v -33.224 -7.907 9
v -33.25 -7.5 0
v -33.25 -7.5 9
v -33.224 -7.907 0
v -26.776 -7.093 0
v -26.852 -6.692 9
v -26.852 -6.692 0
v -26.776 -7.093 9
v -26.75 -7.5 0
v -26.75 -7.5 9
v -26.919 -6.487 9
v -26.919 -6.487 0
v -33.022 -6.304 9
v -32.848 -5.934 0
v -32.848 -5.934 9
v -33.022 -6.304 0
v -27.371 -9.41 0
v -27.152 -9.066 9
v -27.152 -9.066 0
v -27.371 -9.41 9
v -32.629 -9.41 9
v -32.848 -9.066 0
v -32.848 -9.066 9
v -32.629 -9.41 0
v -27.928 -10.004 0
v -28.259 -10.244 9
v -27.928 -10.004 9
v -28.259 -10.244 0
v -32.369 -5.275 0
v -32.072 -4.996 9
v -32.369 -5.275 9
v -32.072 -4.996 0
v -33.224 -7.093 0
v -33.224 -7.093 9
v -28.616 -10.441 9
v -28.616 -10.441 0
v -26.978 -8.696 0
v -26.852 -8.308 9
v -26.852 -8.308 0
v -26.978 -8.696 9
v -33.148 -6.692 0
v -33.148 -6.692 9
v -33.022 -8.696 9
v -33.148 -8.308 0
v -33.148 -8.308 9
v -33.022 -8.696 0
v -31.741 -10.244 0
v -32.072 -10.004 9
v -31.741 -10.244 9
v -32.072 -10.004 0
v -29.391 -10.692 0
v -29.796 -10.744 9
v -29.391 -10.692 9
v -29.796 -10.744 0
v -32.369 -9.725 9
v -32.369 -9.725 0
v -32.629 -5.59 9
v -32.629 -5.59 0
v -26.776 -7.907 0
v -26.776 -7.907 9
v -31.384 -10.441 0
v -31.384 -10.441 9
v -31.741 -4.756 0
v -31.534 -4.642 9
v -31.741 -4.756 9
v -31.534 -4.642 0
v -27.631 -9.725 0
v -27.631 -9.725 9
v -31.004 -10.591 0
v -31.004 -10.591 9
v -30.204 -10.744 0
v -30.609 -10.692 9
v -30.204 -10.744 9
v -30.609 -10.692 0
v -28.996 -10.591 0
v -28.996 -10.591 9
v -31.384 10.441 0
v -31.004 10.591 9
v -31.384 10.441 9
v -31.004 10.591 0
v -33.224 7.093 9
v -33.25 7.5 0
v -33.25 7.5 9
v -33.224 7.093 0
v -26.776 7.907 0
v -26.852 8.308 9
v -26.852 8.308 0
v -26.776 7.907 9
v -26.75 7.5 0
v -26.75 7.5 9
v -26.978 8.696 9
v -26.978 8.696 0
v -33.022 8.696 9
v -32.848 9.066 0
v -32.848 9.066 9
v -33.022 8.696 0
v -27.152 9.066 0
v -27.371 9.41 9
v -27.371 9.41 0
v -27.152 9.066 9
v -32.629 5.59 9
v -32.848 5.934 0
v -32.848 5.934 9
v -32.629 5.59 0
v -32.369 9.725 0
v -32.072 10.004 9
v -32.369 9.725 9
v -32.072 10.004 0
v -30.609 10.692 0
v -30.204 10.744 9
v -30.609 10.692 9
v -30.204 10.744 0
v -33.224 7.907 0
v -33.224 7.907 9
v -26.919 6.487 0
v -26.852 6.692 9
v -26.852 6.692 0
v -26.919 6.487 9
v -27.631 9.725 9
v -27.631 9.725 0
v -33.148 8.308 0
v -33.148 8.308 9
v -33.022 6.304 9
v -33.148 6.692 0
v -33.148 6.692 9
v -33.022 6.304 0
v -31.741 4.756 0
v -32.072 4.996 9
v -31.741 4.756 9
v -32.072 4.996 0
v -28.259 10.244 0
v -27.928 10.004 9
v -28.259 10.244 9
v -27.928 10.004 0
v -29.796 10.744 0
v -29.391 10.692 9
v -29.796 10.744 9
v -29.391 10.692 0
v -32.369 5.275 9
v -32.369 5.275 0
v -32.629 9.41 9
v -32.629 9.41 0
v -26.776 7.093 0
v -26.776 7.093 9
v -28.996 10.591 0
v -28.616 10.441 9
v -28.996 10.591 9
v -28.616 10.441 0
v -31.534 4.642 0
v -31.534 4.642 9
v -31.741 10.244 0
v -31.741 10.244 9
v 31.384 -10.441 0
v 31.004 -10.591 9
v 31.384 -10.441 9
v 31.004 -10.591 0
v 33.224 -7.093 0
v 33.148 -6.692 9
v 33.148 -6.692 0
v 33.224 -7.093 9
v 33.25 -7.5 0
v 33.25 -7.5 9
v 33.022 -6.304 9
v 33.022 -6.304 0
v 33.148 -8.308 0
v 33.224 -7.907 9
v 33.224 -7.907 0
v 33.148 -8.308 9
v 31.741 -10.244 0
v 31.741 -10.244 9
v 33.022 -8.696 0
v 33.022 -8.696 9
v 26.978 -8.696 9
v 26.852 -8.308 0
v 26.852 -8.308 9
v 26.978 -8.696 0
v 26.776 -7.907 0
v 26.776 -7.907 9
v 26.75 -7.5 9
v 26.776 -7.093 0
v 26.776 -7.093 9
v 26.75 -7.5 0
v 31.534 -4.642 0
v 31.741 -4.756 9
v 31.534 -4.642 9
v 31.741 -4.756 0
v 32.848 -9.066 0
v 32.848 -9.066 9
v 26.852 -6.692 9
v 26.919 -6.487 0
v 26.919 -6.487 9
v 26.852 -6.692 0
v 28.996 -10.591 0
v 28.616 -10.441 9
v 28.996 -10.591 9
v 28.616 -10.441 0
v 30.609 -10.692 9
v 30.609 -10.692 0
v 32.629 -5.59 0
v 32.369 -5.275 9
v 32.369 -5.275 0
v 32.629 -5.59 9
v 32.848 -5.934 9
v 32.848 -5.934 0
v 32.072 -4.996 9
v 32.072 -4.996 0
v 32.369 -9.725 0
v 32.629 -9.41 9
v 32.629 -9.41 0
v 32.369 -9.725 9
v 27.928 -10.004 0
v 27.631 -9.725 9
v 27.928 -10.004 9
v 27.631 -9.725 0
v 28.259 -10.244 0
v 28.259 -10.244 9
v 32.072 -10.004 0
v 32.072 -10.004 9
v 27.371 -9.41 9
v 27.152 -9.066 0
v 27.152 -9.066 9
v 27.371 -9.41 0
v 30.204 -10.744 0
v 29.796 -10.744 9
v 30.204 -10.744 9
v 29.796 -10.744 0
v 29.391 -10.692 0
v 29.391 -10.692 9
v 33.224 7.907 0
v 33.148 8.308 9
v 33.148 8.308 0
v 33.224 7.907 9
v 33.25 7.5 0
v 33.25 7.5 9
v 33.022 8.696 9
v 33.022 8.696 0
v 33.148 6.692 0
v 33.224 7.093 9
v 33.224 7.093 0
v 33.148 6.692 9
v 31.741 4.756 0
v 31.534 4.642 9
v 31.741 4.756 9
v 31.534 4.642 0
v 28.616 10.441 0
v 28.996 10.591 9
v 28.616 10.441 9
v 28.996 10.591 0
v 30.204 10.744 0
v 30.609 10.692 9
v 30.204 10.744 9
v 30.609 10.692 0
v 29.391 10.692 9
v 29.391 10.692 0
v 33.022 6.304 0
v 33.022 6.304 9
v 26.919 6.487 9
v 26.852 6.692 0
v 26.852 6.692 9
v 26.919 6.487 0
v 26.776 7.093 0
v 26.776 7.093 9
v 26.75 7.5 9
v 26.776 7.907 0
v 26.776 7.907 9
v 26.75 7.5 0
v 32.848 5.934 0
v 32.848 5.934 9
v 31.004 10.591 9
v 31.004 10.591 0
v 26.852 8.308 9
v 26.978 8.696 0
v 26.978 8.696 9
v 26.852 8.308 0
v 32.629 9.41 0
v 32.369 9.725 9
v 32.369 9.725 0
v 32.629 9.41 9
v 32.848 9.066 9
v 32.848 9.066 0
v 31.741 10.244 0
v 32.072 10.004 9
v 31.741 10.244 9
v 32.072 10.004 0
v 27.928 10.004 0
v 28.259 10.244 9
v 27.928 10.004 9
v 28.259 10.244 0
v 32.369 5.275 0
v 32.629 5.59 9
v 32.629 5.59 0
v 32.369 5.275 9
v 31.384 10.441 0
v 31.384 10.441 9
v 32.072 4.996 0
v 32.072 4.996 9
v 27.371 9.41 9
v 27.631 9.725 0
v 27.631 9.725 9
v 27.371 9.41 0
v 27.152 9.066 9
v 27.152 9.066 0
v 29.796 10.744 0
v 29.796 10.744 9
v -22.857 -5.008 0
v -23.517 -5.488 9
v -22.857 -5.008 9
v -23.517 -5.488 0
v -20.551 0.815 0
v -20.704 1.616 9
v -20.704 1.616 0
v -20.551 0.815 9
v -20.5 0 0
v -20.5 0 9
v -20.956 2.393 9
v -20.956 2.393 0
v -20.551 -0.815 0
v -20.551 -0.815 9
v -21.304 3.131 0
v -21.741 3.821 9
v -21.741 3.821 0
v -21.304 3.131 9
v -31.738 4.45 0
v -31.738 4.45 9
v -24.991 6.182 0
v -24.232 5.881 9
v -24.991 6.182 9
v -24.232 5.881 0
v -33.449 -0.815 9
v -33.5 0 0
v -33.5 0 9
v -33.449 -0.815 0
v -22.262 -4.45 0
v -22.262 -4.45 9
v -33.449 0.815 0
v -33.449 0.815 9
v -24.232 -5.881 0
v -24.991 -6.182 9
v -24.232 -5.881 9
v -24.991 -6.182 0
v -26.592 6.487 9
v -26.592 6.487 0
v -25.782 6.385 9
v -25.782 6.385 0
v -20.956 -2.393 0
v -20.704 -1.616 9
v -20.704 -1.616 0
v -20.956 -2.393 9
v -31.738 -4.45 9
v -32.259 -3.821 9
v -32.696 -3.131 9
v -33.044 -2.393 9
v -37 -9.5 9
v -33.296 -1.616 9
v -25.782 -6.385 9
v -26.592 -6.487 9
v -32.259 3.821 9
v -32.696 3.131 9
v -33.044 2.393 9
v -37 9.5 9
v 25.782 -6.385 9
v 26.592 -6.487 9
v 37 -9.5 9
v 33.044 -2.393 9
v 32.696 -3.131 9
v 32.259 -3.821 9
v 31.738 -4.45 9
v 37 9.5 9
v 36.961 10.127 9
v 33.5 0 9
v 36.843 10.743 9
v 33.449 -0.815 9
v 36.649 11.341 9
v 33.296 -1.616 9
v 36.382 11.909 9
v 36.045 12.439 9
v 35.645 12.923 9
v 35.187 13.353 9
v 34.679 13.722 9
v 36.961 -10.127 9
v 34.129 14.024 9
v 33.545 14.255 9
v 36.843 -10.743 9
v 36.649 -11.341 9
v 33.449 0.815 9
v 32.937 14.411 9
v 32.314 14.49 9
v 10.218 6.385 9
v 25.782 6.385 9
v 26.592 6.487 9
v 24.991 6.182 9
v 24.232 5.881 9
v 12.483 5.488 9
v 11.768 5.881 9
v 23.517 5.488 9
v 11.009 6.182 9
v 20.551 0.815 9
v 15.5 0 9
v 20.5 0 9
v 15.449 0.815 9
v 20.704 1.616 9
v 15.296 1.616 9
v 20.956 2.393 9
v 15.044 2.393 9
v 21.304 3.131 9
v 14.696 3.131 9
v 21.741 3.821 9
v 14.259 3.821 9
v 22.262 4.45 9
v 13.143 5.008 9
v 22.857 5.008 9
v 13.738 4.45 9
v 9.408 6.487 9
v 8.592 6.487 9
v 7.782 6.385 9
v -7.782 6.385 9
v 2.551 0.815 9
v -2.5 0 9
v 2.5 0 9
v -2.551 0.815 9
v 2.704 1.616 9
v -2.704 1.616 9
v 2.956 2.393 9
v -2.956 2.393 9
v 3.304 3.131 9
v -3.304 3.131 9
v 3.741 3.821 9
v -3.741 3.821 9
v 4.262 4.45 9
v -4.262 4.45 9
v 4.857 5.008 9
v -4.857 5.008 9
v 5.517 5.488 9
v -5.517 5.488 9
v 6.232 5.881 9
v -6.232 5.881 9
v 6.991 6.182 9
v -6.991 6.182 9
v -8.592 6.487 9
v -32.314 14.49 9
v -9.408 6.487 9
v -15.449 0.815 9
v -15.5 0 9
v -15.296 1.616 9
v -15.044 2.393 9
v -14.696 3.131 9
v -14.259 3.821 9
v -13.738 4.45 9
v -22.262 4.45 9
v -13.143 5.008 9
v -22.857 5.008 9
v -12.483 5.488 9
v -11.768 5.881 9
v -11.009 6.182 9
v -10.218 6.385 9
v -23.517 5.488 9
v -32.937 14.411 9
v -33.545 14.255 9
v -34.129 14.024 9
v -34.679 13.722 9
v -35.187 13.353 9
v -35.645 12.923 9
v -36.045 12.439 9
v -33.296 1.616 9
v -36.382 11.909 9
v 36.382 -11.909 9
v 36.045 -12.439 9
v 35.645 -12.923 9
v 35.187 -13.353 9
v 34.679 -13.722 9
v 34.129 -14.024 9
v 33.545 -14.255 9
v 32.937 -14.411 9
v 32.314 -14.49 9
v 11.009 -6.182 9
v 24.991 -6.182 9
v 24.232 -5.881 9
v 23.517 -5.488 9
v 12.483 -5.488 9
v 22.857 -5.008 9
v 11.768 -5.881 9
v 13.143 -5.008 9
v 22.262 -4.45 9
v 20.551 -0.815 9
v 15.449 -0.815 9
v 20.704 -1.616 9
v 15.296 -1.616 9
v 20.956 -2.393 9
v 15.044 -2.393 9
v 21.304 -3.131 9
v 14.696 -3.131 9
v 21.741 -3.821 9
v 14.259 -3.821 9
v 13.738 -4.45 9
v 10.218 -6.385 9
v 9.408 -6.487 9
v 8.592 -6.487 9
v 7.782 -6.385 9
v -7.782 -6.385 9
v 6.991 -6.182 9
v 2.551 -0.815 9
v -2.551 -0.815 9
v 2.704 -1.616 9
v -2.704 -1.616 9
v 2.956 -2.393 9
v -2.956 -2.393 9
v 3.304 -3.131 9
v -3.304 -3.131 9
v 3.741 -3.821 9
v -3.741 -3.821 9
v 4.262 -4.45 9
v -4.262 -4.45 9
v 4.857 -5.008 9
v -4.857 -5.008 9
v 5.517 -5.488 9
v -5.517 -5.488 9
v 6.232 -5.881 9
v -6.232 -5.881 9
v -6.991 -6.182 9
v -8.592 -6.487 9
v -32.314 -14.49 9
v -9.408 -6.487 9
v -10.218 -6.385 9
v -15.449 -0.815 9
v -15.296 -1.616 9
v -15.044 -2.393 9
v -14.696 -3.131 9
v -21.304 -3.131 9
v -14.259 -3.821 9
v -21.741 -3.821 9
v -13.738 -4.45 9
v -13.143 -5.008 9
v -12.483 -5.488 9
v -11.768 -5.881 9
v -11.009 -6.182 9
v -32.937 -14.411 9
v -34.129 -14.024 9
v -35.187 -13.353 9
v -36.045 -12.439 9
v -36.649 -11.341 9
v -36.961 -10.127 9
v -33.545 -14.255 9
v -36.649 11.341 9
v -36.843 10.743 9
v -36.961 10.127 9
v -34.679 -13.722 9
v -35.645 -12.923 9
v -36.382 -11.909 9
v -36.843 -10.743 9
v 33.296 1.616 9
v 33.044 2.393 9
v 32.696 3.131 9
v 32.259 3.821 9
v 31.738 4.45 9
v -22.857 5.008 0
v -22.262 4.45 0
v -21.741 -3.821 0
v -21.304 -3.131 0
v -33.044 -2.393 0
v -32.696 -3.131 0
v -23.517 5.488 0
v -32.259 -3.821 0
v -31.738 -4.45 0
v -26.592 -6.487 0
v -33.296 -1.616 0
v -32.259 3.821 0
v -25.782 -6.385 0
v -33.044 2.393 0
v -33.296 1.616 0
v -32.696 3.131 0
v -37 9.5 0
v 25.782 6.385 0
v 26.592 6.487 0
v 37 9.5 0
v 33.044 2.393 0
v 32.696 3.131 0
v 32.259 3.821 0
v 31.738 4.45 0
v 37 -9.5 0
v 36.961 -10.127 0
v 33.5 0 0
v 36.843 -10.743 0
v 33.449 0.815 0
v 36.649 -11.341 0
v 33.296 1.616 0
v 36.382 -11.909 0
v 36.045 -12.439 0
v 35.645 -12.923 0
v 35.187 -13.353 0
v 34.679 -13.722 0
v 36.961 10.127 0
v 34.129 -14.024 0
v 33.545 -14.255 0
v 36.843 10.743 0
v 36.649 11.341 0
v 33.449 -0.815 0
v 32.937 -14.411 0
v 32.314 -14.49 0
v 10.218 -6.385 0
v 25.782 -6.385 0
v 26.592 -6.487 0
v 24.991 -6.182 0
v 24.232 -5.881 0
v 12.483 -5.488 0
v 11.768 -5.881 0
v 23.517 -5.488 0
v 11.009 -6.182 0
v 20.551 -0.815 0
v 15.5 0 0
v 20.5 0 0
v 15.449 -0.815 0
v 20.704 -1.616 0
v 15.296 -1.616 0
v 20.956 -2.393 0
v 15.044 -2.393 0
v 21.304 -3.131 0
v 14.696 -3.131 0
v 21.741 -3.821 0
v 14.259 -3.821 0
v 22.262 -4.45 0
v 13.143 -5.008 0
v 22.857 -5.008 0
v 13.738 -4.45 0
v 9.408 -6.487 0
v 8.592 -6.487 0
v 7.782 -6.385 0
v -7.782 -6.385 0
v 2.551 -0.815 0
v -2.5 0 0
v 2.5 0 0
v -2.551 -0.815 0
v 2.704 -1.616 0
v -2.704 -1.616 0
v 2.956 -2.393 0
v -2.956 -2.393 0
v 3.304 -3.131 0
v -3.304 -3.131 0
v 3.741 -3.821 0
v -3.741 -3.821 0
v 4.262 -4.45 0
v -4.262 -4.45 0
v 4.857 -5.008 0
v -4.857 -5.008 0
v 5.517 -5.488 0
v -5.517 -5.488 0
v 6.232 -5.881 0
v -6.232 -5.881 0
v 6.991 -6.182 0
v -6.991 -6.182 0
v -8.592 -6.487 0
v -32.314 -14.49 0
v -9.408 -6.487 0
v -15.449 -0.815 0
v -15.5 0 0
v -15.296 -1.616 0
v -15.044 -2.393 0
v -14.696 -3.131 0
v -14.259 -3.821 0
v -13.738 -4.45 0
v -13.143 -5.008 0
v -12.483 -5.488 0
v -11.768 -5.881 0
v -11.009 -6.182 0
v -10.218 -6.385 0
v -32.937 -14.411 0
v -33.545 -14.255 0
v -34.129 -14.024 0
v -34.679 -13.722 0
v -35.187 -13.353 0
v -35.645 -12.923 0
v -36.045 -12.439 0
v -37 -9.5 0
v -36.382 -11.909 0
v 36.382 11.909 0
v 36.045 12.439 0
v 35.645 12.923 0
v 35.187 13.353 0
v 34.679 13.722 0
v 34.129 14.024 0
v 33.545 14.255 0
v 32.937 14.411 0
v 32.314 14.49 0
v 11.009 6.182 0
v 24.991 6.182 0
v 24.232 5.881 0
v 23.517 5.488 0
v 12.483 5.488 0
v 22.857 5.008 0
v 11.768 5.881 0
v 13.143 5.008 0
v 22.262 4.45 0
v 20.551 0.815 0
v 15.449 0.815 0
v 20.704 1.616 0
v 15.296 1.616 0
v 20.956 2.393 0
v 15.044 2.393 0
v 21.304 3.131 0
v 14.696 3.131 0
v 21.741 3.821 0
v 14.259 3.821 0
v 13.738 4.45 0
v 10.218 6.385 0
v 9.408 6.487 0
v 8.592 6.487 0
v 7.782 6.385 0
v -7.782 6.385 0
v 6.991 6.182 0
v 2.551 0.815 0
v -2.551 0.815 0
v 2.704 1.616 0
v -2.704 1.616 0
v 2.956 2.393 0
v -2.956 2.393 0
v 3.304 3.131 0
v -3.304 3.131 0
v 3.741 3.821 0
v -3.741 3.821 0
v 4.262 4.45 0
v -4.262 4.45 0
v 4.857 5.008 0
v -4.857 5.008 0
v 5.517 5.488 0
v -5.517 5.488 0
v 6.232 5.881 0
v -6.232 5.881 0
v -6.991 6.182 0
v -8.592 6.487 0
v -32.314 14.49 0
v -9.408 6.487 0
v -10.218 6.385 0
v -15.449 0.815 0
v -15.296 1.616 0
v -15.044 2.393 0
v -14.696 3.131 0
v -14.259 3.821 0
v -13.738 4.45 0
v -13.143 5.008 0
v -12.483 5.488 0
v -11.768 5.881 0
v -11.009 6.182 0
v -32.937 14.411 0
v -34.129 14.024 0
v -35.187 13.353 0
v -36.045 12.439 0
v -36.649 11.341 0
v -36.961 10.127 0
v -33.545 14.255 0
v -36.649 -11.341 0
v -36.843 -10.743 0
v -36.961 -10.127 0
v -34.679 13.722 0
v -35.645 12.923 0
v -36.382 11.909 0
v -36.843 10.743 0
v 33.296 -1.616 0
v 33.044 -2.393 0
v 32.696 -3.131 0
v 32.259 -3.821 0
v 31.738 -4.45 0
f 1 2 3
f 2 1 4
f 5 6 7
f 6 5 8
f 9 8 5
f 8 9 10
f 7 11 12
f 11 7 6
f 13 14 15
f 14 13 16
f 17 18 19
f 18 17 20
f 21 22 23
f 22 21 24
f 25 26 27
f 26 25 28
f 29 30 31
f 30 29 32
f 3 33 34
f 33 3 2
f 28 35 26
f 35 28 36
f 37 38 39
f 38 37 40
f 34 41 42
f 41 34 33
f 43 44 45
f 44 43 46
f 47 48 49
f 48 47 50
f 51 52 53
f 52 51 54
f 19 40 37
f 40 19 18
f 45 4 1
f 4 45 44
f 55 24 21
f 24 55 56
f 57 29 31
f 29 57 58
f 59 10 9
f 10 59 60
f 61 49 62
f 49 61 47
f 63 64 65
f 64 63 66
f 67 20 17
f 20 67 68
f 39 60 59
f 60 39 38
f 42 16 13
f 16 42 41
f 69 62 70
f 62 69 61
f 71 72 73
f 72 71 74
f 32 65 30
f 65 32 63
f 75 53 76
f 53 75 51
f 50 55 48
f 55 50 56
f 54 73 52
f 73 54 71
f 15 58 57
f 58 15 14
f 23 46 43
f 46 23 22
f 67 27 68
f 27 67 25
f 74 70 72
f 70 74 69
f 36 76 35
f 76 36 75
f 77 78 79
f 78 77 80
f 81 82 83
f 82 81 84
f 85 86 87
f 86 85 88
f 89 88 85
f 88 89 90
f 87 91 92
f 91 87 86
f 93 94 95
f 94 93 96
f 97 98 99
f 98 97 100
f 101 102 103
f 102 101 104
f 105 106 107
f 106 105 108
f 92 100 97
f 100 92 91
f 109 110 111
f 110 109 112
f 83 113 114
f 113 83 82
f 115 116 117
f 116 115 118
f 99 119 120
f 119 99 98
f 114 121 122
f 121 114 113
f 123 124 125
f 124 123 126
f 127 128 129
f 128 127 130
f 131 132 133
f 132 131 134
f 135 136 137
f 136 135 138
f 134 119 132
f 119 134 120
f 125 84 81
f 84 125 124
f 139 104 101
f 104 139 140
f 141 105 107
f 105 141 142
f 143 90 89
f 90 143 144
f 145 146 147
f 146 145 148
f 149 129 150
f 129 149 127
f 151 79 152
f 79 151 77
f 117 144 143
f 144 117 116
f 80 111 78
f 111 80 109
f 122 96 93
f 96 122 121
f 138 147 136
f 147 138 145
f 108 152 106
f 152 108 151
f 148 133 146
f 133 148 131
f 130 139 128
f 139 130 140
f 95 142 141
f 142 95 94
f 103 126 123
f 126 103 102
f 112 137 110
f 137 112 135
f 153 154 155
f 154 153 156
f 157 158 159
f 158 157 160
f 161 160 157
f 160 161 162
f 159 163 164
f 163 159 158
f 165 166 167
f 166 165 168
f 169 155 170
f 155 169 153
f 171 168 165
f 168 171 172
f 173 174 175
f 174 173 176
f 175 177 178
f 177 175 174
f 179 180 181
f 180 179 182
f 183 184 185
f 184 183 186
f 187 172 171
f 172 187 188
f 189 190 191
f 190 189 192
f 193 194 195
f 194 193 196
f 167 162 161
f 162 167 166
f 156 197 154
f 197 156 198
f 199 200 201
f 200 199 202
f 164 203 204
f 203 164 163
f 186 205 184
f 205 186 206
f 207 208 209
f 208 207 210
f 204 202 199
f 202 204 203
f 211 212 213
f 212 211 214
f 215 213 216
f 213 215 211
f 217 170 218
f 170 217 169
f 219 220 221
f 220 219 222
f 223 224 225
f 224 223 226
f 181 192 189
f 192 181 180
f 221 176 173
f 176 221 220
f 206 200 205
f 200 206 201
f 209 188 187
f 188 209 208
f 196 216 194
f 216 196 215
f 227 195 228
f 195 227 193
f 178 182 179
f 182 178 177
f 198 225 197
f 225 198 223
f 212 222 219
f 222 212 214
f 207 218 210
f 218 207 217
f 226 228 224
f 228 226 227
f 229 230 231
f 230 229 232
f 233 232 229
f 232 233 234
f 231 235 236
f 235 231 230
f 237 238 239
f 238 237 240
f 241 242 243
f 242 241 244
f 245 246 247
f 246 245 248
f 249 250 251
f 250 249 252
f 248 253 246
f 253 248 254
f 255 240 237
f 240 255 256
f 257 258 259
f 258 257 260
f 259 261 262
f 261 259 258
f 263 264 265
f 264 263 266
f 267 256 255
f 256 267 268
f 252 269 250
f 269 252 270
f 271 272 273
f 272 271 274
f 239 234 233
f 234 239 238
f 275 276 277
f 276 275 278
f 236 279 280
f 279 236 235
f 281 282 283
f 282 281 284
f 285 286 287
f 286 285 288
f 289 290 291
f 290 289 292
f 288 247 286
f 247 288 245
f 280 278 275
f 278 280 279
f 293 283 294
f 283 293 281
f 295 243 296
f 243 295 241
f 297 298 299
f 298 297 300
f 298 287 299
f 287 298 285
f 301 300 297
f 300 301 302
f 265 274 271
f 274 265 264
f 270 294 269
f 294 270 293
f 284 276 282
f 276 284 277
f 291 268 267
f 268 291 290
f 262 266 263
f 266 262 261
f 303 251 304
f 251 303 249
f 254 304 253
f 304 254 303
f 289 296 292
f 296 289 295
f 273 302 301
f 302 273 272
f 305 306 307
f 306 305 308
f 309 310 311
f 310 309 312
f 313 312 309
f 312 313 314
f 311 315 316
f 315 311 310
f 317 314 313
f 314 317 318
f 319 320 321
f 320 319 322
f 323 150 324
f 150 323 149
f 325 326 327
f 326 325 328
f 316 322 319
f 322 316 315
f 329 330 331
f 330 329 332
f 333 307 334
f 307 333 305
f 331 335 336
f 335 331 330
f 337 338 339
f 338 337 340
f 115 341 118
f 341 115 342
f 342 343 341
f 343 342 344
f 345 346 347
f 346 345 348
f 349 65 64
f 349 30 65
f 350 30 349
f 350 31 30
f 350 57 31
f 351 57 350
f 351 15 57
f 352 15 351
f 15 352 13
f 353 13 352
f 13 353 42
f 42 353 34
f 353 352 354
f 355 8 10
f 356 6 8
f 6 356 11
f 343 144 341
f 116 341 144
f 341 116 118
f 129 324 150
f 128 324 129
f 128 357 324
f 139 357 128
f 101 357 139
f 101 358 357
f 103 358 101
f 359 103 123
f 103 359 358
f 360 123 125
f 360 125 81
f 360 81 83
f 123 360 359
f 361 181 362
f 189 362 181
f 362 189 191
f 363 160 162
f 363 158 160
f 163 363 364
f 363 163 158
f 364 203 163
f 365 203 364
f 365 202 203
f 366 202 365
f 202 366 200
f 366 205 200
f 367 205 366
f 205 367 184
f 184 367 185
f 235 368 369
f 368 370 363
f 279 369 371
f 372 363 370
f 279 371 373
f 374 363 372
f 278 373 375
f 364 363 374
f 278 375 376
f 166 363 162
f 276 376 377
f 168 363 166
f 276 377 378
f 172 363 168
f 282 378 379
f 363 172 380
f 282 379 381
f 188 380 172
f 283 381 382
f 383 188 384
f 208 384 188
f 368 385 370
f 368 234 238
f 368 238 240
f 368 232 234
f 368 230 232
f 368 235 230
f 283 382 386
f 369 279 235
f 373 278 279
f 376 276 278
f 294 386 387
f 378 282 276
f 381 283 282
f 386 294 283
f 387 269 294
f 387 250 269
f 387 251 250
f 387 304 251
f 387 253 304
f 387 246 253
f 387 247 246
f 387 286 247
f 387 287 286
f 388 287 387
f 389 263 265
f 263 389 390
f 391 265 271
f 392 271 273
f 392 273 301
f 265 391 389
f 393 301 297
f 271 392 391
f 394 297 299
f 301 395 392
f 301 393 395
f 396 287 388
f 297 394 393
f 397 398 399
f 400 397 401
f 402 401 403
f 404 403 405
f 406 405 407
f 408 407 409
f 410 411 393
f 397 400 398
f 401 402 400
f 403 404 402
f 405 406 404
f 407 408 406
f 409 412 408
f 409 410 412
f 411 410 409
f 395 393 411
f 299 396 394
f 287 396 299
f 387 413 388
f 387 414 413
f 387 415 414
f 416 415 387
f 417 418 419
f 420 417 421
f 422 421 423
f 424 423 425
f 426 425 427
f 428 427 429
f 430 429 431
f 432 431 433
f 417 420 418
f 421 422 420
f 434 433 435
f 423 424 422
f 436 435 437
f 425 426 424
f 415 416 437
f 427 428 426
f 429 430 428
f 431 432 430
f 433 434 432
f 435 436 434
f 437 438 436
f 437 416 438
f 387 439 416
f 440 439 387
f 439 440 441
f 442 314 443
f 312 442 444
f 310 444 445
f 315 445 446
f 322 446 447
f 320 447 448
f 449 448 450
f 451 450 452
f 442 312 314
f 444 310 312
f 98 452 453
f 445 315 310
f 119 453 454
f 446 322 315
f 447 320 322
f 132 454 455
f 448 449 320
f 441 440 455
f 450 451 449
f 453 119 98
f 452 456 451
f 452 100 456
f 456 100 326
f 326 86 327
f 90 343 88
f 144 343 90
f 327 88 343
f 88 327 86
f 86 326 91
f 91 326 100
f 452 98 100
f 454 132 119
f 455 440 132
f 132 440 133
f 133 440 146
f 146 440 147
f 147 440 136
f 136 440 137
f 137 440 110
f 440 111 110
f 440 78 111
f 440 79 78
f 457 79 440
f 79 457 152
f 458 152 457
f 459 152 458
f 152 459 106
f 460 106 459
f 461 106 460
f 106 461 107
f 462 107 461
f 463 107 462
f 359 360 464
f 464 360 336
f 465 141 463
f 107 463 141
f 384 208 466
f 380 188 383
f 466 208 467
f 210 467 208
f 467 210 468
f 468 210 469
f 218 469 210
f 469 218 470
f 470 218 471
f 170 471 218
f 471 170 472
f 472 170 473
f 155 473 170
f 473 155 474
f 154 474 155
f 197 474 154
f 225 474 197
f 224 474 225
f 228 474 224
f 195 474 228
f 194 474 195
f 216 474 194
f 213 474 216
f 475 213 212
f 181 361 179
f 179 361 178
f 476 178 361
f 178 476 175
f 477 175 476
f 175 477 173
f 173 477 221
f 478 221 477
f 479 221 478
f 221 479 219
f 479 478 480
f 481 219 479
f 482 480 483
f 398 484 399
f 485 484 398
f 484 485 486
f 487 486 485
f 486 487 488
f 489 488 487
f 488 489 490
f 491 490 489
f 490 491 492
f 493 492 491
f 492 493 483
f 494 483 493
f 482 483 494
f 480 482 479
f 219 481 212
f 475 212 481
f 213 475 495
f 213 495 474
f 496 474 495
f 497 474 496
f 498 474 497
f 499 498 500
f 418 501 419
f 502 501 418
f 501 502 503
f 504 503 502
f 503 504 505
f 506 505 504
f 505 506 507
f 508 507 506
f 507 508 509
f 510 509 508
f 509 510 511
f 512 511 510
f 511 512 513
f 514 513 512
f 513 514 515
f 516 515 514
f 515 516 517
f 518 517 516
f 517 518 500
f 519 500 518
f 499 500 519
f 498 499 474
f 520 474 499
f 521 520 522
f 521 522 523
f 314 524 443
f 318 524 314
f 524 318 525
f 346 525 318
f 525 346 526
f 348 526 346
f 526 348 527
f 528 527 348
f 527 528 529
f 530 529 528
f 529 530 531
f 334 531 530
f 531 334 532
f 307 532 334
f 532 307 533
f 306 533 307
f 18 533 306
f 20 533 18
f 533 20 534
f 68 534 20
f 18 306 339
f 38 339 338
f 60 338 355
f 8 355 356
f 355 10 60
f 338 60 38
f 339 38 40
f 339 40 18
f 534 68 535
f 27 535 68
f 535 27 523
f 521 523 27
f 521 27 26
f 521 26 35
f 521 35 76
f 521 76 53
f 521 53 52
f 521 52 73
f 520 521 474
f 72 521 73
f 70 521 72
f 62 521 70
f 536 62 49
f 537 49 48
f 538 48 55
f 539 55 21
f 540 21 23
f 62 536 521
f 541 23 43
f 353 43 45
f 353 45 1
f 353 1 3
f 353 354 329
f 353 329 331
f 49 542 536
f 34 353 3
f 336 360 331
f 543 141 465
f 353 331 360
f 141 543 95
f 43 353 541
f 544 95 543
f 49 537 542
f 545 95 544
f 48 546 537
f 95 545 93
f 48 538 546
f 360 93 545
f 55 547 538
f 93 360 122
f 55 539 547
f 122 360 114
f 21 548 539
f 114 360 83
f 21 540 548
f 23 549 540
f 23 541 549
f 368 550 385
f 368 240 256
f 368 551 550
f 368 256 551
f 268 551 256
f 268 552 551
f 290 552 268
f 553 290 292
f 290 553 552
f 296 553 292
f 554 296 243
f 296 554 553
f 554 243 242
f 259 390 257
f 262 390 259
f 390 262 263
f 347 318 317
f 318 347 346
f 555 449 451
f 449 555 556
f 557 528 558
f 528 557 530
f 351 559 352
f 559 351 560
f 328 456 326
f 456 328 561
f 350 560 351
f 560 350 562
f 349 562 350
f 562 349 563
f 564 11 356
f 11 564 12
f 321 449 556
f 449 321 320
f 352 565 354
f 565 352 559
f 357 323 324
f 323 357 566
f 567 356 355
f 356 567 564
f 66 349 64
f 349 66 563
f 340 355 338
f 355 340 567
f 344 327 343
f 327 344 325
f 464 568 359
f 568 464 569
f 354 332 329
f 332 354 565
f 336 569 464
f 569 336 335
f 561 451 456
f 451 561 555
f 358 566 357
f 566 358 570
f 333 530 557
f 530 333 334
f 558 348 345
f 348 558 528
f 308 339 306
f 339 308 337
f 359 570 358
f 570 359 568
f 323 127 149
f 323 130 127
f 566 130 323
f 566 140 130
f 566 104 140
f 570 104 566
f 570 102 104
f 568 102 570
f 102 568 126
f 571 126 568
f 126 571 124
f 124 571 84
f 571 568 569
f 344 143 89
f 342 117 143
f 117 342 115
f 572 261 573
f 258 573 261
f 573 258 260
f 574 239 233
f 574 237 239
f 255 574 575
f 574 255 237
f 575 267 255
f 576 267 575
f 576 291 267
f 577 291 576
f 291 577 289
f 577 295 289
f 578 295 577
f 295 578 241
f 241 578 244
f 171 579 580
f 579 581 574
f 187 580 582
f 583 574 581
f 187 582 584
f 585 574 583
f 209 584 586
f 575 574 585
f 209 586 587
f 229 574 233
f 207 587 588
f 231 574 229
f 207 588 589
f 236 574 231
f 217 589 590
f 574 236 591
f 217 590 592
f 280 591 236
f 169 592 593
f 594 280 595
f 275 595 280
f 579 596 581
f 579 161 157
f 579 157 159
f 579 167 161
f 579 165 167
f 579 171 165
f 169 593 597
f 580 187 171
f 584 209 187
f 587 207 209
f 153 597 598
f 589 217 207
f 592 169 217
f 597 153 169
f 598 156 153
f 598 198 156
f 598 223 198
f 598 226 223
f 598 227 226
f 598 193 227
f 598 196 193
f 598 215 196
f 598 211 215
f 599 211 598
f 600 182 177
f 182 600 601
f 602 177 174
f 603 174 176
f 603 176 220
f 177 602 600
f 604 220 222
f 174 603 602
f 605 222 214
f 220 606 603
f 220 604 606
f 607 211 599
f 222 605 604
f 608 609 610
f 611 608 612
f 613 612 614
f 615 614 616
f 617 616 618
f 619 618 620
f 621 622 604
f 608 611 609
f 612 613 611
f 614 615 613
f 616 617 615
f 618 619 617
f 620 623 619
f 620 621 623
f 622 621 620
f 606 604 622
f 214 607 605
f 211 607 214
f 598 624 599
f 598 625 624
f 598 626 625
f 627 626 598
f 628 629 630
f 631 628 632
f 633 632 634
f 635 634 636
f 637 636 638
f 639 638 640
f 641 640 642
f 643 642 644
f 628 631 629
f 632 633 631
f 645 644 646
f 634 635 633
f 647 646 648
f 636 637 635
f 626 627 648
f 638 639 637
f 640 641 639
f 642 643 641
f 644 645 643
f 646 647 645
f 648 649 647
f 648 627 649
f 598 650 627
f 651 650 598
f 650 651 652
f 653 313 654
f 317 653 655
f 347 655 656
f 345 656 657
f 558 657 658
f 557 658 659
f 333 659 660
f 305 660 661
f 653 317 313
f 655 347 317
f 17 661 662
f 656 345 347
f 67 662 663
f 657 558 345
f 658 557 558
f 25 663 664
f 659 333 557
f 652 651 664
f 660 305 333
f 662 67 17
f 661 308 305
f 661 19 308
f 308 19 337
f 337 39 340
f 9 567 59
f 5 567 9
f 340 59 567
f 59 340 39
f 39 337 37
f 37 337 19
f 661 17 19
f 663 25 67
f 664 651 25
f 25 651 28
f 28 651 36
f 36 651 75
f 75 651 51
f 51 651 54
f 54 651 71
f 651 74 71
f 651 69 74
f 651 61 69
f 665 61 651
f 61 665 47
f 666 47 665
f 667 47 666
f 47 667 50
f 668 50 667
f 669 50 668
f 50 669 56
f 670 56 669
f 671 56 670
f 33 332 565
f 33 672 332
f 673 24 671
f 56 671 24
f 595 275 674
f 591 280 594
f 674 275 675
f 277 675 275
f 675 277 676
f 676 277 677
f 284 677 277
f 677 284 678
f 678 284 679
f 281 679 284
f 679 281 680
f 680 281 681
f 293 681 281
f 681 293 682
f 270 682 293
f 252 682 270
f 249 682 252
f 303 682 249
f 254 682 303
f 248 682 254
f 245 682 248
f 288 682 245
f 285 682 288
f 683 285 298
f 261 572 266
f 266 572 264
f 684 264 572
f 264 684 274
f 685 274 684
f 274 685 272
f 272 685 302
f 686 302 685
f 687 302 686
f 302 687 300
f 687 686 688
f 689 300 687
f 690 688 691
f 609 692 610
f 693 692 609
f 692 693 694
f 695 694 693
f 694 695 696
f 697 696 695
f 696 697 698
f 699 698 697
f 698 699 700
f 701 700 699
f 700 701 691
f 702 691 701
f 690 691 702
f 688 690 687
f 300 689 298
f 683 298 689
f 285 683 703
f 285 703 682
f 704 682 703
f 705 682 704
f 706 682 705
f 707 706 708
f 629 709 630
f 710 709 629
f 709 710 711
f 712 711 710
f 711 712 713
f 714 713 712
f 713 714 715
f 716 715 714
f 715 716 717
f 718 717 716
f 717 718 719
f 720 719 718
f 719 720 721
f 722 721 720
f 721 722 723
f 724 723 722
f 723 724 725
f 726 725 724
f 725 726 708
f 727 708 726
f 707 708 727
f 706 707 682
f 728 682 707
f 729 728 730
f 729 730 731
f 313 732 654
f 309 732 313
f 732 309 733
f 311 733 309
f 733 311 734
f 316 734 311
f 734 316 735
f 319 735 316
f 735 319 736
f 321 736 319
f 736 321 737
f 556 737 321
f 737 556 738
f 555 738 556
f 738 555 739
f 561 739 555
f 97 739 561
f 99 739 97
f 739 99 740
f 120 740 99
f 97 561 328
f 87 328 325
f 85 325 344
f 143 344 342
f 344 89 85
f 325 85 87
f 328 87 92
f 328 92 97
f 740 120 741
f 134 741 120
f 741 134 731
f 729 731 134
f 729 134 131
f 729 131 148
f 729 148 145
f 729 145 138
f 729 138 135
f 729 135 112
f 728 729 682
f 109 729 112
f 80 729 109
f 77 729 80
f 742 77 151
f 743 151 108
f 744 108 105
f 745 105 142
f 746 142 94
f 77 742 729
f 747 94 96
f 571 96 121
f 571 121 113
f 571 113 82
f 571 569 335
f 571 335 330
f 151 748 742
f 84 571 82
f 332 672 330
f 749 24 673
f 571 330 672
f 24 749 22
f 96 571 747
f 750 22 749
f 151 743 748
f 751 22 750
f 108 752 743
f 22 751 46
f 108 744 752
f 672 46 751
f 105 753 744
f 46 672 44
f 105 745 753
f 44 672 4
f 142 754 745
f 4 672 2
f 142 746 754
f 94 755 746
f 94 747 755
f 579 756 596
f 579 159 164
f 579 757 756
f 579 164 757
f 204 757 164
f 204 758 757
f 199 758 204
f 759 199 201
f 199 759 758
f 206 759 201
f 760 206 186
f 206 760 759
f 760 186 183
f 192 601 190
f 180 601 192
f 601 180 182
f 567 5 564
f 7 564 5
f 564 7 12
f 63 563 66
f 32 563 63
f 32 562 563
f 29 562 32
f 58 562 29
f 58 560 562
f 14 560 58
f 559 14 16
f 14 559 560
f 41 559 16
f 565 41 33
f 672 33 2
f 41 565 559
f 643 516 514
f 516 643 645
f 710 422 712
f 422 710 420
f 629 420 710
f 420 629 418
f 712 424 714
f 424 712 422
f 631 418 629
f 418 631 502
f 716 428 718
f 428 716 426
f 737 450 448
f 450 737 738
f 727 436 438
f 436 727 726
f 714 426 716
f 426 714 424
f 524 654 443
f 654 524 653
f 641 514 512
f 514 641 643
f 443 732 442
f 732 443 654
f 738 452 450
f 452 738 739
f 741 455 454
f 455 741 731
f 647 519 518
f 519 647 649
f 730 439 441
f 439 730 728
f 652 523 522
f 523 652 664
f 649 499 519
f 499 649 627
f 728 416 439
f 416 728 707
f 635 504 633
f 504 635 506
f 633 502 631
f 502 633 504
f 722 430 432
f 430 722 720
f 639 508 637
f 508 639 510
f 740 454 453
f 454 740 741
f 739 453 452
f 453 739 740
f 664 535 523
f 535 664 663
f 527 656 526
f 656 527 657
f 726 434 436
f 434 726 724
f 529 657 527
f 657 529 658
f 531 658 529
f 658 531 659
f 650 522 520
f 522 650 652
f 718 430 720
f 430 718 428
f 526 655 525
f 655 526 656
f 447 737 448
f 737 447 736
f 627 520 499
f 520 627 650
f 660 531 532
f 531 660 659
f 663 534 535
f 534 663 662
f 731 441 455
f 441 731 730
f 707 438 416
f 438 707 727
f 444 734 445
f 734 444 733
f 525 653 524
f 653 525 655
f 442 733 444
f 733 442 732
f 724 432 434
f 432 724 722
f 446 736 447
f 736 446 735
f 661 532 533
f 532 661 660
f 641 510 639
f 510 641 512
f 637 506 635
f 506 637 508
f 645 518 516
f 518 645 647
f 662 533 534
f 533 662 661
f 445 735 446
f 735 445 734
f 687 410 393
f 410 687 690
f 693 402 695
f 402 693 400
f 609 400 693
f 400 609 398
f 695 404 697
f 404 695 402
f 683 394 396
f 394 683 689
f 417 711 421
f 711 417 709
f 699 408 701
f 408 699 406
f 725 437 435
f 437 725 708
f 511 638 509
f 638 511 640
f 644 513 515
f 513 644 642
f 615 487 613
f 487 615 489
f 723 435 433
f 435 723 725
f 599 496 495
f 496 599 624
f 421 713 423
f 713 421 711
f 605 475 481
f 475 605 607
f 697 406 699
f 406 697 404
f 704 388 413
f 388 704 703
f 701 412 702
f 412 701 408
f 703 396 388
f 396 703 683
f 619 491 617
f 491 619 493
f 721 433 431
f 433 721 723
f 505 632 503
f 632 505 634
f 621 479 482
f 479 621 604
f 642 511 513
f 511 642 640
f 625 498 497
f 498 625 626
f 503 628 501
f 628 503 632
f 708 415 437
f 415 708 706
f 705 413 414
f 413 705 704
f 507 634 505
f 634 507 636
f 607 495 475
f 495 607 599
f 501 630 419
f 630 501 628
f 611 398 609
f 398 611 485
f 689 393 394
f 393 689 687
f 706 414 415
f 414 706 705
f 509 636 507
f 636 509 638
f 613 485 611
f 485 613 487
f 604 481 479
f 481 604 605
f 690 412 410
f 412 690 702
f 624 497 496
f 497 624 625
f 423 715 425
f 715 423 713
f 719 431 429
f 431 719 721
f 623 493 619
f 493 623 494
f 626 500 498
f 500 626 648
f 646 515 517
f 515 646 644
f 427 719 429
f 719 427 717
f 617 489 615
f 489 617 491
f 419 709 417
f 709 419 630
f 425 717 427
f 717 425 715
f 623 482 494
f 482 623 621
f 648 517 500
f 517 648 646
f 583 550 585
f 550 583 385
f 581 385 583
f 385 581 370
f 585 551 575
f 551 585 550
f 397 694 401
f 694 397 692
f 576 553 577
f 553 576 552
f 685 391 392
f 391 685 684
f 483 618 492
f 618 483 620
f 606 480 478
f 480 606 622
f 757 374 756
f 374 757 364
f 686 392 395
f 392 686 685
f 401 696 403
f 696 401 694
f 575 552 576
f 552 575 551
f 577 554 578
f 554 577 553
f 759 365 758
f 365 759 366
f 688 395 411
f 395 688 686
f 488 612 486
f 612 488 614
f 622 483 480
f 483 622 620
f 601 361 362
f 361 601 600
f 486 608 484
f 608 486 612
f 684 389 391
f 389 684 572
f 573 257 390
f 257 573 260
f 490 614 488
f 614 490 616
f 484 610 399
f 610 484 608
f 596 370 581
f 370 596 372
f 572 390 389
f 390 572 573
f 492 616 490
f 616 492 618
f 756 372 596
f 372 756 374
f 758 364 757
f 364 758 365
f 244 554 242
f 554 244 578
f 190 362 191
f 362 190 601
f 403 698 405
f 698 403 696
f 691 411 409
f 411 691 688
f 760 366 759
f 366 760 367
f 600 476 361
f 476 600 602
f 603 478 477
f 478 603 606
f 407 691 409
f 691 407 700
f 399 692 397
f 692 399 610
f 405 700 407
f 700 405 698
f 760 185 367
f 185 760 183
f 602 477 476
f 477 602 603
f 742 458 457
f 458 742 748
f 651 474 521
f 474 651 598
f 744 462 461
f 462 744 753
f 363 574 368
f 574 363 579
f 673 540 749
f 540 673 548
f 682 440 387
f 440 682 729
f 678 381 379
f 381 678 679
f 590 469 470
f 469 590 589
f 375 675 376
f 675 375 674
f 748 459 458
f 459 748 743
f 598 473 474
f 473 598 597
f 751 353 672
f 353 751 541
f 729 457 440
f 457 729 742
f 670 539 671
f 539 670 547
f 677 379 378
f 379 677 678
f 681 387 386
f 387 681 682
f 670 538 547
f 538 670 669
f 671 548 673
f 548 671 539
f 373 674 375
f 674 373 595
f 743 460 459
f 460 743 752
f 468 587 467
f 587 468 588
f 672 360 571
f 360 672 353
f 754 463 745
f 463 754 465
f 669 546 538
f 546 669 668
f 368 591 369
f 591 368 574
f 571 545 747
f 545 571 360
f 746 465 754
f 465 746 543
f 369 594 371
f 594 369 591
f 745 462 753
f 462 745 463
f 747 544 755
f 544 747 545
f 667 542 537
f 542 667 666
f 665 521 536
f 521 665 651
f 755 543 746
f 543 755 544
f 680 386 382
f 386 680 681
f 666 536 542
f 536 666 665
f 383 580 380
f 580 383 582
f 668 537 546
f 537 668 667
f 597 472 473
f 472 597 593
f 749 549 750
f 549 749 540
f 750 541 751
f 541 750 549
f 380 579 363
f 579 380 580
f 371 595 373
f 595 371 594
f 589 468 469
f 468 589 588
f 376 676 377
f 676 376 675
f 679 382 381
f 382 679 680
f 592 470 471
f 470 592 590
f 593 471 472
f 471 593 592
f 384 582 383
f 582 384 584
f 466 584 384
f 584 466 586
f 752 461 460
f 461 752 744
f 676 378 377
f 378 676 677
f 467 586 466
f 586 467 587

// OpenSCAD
$fn = 50;


difference() {
	union() {
		hull() {
			translate(v = [-32.0000000000, 9.5000000000, 0]) {
				cylinder(h = 9, r = 5);
			}
			translate(v = [32.0000000000, 9.5000000000, 0]) {
				cylinder(h = 9, r = 5);
			}
			translate(v = [-32.0000000000, -9.5000000000, 0]) {
				cylinder(h = 9, r = 5);
			}
			translate(v = [32.0000000000, -9.5000000000, 0]) {
				cylinder(h = 9, r = 5);
			}
		}
	}
	union() {
		#translate(v = [-30.0000000000, -7.5000000000, -100.0000000000]) {
			cylinder(h = 200, r = 3.2500000000);
		}
		#translate(v = [-30.0000000000, 7.5000000000, -100.0000000000]) {
			cylinder(h = 200, r = 3.2500000000);
		}
		#translate(v = [30.0000000000, -7.5000000000, -100.0000000000]) {
			cylinder(h = 200, r = 3.2500000000);
		}
		#translate(v = [30.0000000000, 7.5000000000, -100.0000000000]) {
			cylinder(h = 200, r = 3.2500000000);
		}
		#translate(v = [-27.0000000000, 0, 0]) {
			cylinder(h = 9, r = 6.5000000000);
		}
		#translate(v = [-9.0000000000, 0, 0]) {
			cylinder(h = 9, r = 6.5000000000);
		}
		#translate(v = [9.0000000000, 0, 0]) {
			cylinder(h = 9, r = 6.5000000000);
		}
		#translate(v = [27.0000000000, 0, 0]) {
			cylinder(h = 9, r = 6.5000000000);
		}
	}
}
